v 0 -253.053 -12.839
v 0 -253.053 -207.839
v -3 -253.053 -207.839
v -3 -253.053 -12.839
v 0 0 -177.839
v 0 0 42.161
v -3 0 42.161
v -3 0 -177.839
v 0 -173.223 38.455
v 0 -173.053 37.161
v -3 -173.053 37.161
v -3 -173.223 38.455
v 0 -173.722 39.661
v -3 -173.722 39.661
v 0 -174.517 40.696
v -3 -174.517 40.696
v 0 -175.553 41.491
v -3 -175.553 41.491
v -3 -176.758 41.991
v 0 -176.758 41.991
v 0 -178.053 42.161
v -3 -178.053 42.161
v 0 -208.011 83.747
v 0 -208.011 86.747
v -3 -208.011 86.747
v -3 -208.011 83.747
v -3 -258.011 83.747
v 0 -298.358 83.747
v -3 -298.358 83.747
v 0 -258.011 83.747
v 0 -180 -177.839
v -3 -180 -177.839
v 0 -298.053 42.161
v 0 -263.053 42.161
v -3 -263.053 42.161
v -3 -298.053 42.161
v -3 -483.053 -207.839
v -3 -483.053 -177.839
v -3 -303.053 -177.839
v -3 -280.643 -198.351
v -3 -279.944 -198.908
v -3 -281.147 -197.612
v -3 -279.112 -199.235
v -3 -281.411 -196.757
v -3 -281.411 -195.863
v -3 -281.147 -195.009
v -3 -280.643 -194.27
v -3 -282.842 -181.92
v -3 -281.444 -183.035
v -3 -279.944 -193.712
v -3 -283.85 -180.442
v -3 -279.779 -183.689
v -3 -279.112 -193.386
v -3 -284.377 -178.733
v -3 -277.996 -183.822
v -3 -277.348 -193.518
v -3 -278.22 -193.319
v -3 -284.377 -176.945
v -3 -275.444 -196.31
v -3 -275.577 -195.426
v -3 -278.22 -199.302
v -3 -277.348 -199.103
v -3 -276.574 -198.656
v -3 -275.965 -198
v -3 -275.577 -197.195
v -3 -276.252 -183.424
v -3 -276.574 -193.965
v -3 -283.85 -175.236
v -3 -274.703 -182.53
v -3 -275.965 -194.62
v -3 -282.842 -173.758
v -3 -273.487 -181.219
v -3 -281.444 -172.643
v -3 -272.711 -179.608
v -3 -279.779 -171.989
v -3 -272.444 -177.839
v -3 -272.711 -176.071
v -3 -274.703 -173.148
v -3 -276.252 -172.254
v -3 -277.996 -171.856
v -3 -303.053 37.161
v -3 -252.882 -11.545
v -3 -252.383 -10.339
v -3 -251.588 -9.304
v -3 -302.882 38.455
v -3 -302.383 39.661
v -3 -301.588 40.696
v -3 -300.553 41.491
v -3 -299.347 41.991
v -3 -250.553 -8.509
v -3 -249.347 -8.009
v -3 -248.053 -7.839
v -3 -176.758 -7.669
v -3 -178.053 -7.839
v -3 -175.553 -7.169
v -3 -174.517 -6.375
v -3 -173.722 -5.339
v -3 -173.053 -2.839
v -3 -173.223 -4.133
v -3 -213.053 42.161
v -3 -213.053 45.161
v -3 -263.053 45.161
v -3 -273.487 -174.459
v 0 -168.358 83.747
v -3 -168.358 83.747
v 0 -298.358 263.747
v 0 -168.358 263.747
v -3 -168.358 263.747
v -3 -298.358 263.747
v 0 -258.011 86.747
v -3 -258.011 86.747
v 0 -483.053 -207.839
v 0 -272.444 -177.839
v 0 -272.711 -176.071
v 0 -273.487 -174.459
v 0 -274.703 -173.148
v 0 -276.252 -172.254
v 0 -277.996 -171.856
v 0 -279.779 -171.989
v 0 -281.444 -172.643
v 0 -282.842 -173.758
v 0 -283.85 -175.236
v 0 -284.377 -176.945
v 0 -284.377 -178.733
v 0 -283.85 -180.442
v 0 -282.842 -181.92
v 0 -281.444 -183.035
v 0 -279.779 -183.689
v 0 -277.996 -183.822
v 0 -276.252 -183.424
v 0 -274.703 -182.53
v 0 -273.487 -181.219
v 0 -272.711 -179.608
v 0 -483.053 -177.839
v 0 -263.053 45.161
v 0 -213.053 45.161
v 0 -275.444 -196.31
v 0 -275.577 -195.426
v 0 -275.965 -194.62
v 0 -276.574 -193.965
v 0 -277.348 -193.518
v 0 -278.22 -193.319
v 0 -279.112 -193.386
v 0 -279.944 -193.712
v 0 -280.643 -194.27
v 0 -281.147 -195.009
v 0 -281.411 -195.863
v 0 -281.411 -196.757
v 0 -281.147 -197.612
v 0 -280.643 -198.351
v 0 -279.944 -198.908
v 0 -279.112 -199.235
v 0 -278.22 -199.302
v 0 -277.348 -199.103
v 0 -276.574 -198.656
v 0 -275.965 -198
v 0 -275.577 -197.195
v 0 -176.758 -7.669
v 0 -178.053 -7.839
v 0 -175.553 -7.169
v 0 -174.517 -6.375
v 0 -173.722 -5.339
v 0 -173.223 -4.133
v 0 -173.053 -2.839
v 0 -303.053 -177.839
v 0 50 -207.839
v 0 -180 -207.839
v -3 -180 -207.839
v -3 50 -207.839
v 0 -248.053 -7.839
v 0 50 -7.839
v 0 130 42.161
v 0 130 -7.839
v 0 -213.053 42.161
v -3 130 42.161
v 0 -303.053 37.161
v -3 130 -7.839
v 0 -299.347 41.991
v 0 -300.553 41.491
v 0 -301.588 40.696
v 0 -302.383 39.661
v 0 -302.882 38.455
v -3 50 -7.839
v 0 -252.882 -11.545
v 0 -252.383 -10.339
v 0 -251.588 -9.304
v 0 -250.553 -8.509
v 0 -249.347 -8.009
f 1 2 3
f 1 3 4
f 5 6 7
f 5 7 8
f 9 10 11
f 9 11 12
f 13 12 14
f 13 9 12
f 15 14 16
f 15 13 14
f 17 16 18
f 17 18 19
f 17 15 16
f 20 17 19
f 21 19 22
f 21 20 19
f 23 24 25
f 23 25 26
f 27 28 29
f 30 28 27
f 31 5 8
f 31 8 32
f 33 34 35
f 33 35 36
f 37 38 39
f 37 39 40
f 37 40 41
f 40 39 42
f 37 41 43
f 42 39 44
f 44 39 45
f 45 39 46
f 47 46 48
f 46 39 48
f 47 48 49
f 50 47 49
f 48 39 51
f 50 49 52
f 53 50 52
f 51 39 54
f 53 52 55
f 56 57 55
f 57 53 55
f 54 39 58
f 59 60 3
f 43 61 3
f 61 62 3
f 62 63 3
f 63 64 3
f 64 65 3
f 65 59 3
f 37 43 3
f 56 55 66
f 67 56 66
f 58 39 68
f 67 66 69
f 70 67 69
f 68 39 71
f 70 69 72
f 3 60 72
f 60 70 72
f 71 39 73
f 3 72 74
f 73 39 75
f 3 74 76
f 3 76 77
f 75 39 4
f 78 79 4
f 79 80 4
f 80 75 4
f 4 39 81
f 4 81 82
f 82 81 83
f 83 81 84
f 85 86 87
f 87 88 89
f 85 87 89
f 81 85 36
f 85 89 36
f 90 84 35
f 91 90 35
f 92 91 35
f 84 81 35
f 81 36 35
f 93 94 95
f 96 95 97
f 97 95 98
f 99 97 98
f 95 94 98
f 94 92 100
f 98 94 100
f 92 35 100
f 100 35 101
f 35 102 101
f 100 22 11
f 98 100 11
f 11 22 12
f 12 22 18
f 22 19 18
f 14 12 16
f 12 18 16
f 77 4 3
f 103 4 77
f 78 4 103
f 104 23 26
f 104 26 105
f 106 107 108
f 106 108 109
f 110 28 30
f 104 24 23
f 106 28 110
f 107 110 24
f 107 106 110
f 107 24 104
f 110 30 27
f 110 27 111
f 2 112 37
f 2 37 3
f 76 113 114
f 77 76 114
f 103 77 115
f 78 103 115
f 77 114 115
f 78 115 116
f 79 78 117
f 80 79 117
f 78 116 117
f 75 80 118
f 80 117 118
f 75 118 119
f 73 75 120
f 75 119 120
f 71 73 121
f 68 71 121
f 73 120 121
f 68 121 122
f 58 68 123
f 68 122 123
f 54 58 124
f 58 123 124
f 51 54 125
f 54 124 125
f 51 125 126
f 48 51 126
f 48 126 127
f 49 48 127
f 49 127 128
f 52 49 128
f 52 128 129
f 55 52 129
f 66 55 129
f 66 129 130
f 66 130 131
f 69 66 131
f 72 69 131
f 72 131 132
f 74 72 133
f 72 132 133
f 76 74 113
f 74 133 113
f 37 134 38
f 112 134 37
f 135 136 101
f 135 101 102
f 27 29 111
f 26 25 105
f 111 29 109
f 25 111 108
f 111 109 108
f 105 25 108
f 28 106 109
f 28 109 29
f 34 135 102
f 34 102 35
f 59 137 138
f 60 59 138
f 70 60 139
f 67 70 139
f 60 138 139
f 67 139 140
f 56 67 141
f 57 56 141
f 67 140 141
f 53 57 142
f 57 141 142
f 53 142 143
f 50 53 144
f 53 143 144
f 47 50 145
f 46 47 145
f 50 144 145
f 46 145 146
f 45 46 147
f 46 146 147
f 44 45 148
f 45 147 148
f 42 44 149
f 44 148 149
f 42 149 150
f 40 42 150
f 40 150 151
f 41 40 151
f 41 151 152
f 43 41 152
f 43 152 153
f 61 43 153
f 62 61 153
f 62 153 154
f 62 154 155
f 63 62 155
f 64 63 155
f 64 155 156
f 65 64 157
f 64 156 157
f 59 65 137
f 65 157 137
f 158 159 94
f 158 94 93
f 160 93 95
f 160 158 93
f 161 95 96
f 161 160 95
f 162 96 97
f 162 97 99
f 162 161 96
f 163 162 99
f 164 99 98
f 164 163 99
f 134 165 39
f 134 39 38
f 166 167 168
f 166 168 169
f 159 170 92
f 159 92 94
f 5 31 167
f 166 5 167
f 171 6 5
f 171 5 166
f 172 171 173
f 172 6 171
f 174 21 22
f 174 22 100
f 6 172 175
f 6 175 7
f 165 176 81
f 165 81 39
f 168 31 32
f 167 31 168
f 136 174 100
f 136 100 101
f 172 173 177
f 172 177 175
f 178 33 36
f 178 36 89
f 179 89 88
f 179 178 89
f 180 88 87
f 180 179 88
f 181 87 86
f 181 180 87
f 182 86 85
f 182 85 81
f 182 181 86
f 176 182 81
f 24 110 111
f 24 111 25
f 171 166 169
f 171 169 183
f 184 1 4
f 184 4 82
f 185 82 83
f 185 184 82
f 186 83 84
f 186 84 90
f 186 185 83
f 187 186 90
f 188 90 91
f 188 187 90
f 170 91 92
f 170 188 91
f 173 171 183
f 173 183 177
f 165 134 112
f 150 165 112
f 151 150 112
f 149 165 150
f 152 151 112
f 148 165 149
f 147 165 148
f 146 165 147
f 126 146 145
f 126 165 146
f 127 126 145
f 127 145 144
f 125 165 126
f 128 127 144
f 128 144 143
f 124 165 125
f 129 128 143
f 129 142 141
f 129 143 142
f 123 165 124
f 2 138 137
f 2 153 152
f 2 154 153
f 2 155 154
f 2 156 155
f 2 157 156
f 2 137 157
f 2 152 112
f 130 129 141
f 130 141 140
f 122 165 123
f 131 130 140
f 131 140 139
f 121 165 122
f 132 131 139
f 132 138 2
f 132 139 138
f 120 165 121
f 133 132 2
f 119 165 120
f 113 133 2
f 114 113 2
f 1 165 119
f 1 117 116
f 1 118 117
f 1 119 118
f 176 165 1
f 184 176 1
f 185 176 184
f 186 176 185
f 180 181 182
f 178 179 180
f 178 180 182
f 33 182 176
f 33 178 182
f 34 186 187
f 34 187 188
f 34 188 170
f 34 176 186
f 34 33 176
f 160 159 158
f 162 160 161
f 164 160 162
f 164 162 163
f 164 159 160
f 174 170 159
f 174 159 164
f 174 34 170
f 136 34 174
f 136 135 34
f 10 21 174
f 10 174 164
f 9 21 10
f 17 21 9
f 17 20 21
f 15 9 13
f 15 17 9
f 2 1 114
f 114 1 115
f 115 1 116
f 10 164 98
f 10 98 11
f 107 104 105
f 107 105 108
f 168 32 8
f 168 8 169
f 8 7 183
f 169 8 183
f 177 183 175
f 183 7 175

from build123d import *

# Parameters (mm, degrees)
F0_R     = 3
F0_R_2   = 6
F1_DEPTH = 3


with BuildPart() as f1:
    # F0 (on Right) → F1 (new body)
    with BuildSketch(Plane.YZ):
        Polygon((130, 42.160962), (0, 42.160962), (0, -177.839038), (-180, -177.839038), (-180, -207.839038), (50, -207.839038), (50, -7.839038), (130, -7.839038), align=None)
        with BuildLine():
            Line((-263.052582, 42.160962), (-298.052582, 42.160962))
            ThreePointArc((-298.052582, 42.160962), (-301.588115, 40.696496), (-303.052582, 37.160962))
            Line((-303.052582, 37.160962), (-303.052582, -177.839038))
            Line((-303.052582, -177.839038), (-483.052582, -177.839038))
            Line((-483.052582, -177.839038), (-483.052582, -207.839038))
            Line((-483.052582, -207.839038), (-253.052582, -207.839038))
            Line((-253.052582, -207.839038), (-253.052582, -12.839038))
            ThreePointArc((-253.052582, -12.839038), (-251.588115, -9.303504), (-248.052582, -7.839038))
            Line((-248.052582, -7.839038), (-178.052582, -7.839038))
            ThreePointArc((-178.052582, -7.839038), (-174.517048, -6.374572), (-173.052582, -2.839038))
            Line((-173.052582, -2.839038), (-173.052582, 37.160962))
            ThreePointArc((-173.052582, 37.160962), (-174.517048, 40.696496), (-178.052582, 42.160962))
            Line((-178.052582, 42.160962), (-213.052582, 42.160962))
            Line((-213.052582, 42.160962), (-213.052582, 45.160962))
            Line((-213.052582, 45.160962), (-263.052582, 45.160962))
            Line((-263.052582, 45.160962), (-263.052582, 42.160962))
        make_face()
        with Locations((-278.444022, -196.310371)):
            Circle(F0_R, mode=Mode.SUBTRACT)
        with Locations((-278.444022, -177.839038)):
            Circle(F0_R_2, mode=Mode.SUBTRACT)
        Polygon((-298.358291, 263.74732), (-298.358291, 83.74732), (-258.011132, 83.74732), (-258.011132, 86.74732), (-208.011132, 86.74732), (-208.011132, 83.74732), (-168.358291, 83.74732), (-168.358291, 263.74732), align=None)
    extrude(amount=-F1_DEPTH)


solid = f1.part
